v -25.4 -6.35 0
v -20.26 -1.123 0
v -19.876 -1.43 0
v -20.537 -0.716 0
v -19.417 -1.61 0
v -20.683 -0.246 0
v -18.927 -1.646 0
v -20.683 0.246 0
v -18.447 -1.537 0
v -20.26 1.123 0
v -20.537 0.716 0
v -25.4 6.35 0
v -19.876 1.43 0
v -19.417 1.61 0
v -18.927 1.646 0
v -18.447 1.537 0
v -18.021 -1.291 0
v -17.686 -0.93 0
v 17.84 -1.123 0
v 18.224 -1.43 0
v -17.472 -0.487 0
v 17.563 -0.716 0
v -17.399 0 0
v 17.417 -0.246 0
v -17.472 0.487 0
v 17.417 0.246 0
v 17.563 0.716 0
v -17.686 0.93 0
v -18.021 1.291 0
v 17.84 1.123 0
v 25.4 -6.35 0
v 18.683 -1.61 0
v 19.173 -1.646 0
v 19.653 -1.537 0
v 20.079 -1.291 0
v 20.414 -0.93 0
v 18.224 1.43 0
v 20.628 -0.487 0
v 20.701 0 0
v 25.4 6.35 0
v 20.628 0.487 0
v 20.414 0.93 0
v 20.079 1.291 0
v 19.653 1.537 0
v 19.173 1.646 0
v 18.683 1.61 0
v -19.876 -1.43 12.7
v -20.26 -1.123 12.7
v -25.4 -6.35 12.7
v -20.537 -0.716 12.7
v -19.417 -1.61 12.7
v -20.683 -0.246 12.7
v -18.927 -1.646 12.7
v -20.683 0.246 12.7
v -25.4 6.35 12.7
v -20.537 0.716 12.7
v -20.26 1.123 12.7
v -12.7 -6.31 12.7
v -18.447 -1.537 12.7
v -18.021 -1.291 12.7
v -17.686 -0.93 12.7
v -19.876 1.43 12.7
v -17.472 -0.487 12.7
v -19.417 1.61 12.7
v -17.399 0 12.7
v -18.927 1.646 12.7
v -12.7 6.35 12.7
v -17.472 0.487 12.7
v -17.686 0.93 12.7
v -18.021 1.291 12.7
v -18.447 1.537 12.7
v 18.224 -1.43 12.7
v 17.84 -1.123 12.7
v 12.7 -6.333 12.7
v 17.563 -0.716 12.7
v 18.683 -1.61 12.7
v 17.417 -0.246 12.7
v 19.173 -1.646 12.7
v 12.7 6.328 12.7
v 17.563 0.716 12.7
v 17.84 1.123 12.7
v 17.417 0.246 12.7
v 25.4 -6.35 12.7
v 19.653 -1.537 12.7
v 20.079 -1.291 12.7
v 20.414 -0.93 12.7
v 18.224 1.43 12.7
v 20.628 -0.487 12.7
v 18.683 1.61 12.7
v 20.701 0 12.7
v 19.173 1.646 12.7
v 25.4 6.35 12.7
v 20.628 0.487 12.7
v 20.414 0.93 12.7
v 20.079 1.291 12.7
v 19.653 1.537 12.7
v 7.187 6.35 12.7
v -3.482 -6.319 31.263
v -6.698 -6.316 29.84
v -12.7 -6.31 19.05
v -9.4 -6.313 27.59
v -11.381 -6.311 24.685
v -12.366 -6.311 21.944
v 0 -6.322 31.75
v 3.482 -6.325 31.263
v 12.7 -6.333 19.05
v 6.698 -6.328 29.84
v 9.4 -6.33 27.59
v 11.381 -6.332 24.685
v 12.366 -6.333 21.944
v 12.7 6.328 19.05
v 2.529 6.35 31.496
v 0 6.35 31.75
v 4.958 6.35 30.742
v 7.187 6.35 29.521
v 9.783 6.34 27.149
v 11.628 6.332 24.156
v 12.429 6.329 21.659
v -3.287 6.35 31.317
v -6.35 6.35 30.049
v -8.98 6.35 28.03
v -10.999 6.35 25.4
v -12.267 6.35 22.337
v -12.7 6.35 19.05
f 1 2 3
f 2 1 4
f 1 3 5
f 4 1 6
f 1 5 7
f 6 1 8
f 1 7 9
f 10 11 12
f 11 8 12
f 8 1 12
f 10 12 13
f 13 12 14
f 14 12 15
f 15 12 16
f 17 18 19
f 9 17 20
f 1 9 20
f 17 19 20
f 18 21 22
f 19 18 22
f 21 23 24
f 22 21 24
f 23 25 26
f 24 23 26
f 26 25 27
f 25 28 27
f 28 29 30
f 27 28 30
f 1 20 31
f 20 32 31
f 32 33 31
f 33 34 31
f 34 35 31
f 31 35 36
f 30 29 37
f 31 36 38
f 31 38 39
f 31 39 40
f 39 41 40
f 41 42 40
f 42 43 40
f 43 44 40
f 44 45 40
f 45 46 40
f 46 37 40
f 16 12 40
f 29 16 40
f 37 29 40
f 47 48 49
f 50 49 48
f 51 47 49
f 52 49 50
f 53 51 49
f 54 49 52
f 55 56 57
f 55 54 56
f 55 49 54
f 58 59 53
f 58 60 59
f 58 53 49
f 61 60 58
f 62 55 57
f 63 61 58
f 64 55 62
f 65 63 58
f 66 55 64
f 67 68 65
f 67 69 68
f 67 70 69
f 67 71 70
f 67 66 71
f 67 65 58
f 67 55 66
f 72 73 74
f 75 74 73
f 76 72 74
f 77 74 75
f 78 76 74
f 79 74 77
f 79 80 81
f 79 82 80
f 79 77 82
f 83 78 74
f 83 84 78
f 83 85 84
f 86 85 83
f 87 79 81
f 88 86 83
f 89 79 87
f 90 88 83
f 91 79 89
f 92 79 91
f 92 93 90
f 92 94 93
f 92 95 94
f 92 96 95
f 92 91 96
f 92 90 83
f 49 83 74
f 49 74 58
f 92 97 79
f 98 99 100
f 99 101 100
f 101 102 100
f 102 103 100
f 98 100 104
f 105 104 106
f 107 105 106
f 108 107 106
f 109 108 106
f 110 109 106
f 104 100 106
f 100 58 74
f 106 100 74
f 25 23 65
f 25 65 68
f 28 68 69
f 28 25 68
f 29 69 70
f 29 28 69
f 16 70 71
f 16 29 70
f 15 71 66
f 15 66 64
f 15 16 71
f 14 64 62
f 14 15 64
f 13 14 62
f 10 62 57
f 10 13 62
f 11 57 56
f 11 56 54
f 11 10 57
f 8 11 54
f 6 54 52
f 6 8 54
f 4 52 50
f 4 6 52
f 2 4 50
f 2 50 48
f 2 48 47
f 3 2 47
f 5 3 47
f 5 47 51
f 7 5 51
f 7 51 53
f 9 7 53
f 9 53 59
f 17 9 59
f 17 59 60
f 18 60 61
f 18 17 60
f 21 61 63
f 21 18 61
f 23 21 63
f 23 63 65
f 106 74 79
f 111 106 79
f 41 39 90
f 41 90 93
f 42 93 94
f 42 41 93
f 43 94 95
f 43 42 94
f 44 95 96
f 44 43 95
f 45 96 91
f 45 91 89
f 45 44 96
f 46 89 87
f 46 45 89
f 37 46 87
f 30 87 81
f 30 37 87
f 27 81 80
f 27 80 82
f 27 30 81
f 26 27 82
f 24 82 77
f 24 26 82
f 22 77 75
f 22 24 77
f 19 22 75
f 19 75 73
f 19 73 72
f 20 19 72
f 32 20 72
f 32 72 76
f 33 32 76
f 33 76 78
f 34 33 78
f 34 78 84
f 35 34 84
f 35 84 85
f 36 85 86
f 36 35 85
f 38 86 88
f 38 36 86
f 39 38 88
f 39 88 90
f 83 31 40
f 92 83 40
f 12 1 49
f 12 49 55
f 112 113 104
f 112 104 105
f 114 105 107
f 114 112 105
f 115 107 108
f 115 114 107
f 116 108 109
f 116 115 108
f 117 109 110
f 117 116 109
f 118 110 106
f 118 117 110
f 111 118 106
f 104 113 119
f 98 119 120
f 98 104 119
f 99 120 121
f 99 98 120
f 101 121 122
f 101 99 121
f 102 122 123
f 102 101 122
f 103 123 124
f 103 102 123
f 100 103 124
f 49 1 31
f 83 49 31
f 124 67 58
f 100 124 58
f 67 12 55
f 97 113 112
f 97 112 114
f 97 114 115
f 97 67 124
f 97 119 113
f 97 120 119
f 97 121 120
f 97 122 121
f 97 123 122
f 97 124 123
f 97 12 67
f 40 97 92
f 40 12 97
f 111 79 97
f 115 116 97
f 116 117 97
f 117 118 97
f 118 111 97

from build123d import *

# Parameters (mm, degrees)
F2_DEPTH = 31.75
F0_W     = 50.8
F0_H     = 12.7
F0_R     = 1.651
F3_DEPTH = 12.7
F4_R     = 12.7
F5_R     = 12.69999


# Not quite as in the source:
# - a fillet or chamfer is up to 0.001 mm smaller than in the source, because OpenCascade refuses the exact size


with BuildPart() as f2:
    # F1 (on face) → F2 (new body)
    with BuildSketch(Plane.XY):
        Polygon((12.7, -6.3331015408), (12.7, 6.3278423622), (7.1869615835, 6.35), (-12.7, 6.35), (-12.7, -6.310286466), align=None)
    extrude(amount=F2_DEPTH)

    # F0 (on Top) → F3 (join)
    with BuildSketch(Plane.XY):
        Rectangle(F0_W, F0_H)
        with Locations((-19.05, 0)):
            Circle(F0_R, mode=Mode.SUBTRACT)
        with Locations((19.05, 0)):
            Circle(F0_R, mode=Mode.SUBTRACT)
    extrude(amount=F3_DEPTH)

    # F4
    f4_edges = [f2.edges().sort_by_distance(p)[0] for p in [
        (-12.7, 0.019857, 31.75),
    ]]
    fillet(f4_edges, radius=F4_R)

    # F5 (radius 12.7 in the source; OpenCascade refuses exactly that, so slightly less here)
    f5_edges = [f2.edges().sort_by_distance(p)[0] for p in [
        (12.7, -0.00263, 31.75),
    ]]
    fillet(f5_edges, radius=F5_R)


solid = f2.part
